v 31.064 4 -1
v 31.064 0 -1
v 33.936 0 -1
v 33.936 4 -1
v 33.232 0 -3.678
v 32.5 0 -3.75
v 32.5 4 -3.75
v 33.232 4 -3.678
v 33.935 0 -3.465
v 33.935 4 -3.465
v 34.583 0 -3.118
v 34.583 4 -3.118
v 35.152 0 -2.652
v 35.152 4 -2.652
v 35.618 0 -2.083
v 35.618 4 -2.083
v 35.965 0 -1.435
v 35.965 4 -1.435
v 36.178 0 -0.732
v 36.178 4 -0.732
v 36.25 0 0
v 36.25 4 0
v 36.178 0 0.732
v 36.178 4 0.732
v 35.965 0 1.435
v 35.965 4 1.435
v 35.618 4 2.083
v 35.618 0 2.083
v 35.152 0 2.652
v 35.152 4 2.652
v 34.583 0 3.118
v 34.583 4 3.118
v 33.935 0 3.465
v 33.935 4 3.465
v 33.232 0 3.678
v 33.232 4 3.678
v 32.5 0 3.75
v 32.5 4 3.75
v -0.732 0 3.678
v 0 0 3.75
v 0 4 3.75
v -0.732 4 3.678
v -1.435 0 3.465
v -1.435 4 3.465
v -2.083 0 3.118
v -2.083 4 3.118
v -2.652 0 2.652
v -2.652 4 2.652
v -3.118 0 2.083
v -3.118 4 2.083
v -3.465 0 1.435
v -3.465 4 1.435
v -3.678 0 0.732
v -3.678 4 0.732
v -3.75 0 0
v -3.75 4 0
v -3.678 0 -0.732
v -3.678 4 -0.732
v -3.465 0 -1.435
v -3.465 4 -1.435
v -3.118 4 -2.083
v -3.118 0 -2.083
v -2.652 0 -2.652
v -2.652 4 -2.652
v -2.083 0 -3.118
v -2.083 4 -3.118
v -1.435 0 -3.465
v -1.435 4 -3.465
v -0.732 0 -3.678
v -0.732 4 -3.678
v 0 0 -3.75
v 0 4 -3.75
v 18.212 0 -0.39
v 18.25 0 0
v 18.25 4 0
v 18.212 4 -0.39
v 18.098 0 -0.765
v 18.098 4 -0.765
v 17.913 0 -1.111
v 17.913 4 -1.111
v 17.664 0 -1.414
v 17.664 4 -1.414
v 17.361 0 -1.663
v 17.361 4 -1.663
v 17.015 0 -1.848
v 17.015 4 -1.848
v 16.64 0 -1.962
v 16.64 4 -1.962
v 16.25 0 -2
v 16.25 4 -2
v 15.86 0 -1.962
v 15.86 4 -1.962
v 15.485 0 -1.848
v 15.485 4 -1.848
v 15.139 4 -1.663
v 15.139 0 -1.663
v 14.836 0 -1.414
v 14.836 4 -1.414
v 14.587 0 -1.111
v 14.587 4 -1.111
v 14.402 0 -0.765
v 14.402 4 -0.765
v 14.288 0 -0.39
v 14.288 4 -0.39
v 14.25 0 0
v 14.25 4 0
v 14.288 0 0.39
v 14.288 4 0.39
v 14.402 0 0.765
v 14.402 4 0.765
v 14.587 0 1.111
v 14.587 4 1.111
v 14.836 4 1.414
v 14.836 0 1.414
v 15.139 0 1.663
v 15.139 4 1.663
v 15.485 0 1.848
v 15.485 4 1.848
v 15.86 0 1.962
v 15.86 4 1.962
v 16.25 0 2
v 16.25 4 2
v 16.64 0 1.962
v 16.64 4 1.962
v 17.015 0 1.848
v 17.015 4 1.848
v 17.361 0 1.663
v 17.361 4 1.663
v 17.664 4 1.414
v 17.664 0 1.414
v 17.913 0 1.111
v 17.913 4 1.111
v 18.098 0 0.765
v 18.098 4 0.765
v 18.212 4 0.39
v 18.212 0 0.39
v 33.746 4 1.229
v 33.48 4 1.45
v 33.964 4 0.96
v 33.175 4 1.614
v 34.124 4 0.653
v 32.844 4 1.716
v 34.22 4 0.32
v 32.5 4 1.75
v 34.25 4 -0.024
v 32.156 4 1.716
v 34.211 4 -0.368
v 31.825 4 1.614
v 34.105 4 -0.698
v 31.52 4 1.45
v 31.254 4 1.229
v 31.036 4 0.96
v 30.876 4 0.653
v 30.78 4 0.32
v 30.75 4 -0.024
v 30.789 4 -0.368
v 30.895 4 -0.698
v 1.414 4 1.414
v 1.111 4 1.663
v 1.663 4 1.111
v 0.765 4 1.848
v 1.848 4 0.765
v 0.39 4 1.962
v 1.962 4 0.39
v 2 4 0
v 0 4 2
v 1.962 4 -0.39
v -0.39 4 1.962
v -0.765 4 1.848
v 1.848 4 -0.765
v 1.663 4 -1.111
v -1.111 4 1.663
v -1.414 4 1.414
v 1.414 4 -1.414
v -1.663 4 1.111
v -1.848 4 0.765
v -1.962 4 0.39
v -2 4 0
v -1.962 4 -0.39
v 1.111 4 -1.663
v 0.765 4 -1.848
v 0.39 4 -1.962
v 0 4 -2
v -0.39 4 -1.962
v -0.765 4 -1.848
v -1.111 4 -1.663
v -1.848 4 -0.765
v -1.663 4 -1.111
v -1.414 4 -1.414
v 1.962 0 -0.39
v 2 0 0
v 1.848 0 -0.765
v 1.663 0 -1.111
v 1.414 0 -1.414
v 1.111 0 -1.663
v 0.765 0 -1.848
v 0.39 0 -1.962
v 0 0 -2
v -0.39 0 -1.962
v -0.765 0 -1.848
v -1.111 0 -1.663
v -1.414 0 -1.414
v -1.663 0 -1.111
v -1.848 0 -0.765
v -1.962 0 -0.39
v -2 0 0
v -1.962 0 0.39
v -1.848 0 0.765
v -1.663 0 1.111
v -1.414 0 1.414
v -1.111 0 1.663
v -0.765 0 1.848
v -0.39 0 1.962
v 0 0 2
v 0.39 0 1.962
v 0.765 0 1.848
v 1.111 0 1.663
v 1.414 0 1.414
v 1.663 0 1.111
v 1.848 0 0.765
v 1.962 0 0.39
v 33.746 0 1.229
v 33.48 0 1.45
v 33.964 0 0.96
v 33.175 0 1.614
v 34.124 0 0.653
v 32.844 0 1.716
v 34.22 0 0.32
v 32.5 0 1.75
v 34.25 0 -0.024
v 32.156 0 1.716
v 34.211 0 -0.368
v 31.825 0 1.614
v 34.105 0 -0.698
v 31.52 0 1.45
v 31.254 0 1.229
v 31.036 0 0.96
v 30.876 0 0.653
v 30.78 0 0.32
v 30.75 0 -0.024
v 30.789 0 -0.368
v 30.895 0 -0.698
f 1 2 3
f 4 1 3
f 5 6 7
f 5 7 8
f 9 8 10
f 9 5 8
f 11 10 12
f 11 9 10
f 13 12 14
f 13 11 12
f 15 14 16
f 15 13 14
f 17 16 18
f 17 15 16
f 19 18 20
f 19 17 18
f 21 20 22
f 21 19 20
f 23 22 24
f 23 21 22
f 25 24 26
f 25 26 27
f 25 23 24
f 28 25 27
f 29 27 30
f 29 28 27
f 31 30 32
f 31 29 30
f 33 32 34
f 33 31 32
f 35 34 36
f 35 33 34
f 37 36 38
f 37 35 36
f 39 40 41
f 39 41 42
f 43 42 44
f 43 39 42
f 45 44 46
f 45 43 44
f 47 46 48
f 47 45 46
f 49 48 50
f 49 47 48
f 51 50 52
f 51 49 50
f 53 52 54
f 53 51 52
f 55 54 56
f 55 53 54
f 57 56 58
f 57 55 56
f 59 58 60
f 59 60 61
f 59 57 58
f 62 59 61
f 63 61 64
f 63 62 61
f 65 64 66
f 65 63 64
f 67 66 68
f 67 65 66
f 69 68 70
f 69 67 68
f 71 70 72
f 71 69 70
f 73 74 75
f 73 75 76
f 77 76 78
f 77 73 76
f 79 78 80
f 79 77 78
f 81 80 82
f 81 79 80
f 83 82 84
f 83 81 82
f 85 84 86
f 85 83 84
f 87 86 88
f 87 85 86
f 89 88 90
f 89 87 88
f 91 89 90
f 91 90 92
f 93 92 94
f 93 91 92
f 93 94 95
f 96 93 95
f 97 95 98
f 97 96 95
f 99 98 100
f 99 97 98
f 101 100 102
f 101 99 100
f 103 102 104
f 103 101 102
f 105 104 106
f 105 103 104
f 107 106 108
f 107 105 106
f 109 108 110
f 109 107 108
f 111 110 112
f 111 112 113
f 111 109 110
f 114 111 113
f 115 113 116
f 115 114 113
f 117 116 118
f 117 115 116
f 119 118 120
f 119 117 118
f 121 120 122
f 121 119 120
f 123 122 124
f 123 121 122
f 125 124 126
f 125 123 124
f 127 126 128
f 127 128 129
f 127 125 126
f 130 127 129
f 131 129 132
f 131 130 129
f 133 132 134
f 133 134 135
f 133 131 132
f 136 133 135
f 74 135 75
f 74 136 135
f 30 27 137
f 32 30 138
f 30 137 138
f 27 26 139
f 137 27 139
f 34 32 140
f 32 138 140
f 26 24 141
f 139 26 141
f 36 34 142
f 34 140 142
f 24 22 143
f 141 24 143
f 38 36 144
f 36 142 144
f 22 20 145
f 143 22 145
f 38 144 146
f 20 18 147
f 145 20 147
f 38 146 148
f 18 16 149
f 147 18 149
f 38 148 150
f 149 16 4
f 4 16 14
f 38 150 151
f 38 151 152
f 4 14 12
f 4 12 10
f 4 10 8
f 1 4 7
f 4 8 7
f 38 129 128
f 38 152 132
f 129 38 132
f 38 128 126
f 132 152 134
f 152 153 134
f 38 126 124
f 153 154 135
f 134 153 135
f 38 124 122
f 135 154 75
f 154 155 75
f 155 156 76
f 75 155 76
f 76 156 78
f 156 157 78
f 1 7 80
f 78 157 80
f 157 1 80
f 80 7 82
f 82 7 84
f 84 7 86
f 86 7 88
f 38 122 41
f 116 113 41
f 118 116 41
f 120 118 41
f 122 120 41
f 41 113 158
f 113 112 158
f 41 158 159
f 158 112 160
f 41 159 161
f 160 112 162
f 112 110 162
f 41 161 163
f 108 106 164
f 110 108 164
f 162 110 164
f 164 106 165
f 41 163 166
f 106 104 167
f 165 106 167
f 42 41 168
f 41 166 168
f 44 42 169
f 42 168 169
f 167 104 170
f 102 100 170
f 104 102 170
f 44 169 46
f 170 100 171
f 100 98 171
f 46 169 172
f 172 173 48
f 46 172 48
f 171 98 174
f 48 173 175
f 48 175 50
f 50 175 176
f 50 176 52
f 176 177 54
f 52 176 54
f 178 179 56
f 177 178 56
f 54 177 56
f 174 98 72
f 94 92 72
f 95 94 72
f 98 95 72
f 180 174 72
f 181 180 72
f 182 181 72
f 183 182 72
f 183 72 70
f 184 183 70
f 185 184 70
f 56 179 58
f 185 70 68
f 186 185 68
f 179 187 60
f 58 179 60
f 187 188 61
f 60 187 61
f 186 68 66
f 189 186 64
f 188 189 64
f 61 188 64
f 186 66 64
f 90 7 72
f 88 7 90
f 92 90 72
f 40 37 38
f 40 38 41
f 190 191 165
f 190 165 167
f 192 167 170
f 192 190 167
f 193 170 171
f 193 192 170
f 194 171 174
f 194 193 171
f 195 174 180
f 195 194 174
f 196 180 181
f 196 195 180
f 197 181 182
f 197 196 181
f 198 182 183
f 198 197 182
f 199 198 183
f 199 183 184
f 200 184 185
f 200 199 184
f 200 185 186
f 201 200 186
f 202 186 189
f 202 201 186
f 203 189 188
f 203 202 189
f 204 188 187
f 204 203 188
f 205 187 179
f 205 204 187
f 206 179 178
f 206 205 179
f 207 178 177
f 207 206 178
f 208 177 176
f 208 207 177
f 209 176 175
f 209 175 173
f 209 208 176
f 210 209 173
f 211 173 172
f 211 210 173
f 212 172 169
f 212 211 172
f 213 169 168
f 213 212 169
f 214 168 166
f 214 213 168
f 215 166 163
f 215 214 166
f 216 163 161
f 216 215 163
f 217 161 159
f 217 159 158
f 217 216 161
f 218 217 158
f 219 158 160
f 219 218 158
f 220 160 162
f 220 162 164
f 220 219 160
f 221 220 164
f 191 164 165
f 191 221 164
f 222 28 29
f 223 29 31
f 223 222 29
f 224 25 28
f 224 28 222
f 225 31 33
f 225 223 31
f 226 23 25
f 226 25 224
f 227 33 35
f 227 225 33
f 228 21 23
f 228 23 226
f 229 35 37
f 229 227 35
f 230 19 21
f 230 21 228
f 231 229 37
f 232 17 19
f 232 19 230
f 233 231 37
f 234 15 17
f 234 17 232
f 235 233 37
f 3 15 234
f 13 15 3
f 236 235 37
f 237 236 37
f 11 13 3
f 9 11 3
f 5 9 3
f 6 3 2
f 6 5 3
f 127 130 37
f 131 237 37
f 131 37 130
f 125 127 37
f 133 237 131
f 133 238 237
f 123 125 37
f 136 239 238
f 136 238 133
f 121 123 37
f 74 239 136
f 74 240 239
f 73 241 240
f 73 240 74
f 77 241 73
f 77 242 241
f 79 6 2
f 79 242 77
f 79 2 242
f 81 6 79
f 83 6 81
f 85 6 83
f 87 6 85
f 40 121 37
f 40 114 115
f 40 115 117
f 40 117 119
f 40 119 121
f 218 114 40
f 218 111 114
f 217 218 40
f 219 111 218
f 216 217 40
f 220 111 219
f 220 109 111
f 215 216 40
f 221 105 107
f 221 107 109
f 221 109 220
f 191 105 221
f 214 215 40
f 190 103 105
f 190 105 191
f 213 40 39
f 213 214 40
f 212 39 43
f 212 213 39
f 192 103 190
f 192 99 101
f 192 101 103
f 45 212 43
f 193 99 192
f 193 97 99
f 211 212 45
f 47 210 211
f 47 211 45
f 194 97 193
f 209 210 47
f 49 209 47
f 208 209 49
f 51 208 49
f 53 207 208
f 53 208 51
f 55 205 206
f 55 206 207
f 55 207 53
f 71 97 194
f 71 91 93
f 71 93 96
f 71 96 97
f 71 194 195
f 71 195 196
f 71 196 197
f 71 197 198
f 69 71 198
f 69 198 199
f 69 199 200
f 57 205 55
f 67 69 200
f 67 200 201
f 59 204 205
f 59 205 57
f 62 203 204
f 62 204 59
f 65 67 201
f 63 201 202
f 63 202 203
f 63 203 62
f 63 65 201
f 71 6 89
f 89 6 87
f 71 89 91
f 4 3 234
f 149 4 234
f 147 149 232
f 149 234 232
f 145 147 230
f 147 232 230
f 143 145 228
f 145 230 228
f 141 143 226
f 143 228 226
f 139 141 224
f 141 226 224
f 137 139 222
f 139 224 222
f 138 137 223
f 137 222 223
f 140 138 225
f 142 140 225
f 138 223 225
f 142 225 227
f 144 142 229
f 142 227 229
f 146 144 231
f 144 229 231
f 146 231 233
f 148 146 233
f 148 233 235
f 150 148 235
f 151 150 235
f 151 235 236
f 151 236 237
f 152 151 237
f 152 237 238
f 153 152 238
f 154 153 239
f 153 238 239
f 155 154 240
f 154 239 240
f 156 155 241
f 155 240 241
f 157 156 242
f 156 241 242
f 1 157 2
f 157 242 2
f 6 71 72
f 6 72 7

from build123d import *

# Parameters (mm, degrees)
SKETCH1_R           = 2
BOSS_EXTRUDE1_DEPTH = 4


with BuildPart() as part:
    # Sketch1 → Boss-Extrude1 (new body)
    with BuildSketch(Plane(origin=(0, 0, 0), x_dir=(1, 0, 0), z_dir=(0, 1, 0))):
        with BuildLine():
            Line((0, 3.75), (32.5, 3.75))
            ThreePointArc((32.5, 3.75), (36.25, 0), (32.5, -3.75))
            Line((32.5, -3.75), (0, -3.75))
            ThreePointArc((0, -3.75), (-3.75, 0), (0, 3.75))
        make_face()
        Circle(SKETCH1_R, mode=Mode.SUBTRACT)
        with Locations((16.25, 0)):
            Circle(SKETCH1_R, mode=Mode.SUBTRACT)
        with BuildLine():
            Line((31.063859338, 1), (33.936140662, 1))
            ThreePointArc((33.936140662, 1), (32.5, -1.75), (31.063859338, 1))
        make_face(mode=Mode.SUBTRACT)
    extrude(amount=BOSS_EXTRUDE1_DEPTH)


solid = part.part
